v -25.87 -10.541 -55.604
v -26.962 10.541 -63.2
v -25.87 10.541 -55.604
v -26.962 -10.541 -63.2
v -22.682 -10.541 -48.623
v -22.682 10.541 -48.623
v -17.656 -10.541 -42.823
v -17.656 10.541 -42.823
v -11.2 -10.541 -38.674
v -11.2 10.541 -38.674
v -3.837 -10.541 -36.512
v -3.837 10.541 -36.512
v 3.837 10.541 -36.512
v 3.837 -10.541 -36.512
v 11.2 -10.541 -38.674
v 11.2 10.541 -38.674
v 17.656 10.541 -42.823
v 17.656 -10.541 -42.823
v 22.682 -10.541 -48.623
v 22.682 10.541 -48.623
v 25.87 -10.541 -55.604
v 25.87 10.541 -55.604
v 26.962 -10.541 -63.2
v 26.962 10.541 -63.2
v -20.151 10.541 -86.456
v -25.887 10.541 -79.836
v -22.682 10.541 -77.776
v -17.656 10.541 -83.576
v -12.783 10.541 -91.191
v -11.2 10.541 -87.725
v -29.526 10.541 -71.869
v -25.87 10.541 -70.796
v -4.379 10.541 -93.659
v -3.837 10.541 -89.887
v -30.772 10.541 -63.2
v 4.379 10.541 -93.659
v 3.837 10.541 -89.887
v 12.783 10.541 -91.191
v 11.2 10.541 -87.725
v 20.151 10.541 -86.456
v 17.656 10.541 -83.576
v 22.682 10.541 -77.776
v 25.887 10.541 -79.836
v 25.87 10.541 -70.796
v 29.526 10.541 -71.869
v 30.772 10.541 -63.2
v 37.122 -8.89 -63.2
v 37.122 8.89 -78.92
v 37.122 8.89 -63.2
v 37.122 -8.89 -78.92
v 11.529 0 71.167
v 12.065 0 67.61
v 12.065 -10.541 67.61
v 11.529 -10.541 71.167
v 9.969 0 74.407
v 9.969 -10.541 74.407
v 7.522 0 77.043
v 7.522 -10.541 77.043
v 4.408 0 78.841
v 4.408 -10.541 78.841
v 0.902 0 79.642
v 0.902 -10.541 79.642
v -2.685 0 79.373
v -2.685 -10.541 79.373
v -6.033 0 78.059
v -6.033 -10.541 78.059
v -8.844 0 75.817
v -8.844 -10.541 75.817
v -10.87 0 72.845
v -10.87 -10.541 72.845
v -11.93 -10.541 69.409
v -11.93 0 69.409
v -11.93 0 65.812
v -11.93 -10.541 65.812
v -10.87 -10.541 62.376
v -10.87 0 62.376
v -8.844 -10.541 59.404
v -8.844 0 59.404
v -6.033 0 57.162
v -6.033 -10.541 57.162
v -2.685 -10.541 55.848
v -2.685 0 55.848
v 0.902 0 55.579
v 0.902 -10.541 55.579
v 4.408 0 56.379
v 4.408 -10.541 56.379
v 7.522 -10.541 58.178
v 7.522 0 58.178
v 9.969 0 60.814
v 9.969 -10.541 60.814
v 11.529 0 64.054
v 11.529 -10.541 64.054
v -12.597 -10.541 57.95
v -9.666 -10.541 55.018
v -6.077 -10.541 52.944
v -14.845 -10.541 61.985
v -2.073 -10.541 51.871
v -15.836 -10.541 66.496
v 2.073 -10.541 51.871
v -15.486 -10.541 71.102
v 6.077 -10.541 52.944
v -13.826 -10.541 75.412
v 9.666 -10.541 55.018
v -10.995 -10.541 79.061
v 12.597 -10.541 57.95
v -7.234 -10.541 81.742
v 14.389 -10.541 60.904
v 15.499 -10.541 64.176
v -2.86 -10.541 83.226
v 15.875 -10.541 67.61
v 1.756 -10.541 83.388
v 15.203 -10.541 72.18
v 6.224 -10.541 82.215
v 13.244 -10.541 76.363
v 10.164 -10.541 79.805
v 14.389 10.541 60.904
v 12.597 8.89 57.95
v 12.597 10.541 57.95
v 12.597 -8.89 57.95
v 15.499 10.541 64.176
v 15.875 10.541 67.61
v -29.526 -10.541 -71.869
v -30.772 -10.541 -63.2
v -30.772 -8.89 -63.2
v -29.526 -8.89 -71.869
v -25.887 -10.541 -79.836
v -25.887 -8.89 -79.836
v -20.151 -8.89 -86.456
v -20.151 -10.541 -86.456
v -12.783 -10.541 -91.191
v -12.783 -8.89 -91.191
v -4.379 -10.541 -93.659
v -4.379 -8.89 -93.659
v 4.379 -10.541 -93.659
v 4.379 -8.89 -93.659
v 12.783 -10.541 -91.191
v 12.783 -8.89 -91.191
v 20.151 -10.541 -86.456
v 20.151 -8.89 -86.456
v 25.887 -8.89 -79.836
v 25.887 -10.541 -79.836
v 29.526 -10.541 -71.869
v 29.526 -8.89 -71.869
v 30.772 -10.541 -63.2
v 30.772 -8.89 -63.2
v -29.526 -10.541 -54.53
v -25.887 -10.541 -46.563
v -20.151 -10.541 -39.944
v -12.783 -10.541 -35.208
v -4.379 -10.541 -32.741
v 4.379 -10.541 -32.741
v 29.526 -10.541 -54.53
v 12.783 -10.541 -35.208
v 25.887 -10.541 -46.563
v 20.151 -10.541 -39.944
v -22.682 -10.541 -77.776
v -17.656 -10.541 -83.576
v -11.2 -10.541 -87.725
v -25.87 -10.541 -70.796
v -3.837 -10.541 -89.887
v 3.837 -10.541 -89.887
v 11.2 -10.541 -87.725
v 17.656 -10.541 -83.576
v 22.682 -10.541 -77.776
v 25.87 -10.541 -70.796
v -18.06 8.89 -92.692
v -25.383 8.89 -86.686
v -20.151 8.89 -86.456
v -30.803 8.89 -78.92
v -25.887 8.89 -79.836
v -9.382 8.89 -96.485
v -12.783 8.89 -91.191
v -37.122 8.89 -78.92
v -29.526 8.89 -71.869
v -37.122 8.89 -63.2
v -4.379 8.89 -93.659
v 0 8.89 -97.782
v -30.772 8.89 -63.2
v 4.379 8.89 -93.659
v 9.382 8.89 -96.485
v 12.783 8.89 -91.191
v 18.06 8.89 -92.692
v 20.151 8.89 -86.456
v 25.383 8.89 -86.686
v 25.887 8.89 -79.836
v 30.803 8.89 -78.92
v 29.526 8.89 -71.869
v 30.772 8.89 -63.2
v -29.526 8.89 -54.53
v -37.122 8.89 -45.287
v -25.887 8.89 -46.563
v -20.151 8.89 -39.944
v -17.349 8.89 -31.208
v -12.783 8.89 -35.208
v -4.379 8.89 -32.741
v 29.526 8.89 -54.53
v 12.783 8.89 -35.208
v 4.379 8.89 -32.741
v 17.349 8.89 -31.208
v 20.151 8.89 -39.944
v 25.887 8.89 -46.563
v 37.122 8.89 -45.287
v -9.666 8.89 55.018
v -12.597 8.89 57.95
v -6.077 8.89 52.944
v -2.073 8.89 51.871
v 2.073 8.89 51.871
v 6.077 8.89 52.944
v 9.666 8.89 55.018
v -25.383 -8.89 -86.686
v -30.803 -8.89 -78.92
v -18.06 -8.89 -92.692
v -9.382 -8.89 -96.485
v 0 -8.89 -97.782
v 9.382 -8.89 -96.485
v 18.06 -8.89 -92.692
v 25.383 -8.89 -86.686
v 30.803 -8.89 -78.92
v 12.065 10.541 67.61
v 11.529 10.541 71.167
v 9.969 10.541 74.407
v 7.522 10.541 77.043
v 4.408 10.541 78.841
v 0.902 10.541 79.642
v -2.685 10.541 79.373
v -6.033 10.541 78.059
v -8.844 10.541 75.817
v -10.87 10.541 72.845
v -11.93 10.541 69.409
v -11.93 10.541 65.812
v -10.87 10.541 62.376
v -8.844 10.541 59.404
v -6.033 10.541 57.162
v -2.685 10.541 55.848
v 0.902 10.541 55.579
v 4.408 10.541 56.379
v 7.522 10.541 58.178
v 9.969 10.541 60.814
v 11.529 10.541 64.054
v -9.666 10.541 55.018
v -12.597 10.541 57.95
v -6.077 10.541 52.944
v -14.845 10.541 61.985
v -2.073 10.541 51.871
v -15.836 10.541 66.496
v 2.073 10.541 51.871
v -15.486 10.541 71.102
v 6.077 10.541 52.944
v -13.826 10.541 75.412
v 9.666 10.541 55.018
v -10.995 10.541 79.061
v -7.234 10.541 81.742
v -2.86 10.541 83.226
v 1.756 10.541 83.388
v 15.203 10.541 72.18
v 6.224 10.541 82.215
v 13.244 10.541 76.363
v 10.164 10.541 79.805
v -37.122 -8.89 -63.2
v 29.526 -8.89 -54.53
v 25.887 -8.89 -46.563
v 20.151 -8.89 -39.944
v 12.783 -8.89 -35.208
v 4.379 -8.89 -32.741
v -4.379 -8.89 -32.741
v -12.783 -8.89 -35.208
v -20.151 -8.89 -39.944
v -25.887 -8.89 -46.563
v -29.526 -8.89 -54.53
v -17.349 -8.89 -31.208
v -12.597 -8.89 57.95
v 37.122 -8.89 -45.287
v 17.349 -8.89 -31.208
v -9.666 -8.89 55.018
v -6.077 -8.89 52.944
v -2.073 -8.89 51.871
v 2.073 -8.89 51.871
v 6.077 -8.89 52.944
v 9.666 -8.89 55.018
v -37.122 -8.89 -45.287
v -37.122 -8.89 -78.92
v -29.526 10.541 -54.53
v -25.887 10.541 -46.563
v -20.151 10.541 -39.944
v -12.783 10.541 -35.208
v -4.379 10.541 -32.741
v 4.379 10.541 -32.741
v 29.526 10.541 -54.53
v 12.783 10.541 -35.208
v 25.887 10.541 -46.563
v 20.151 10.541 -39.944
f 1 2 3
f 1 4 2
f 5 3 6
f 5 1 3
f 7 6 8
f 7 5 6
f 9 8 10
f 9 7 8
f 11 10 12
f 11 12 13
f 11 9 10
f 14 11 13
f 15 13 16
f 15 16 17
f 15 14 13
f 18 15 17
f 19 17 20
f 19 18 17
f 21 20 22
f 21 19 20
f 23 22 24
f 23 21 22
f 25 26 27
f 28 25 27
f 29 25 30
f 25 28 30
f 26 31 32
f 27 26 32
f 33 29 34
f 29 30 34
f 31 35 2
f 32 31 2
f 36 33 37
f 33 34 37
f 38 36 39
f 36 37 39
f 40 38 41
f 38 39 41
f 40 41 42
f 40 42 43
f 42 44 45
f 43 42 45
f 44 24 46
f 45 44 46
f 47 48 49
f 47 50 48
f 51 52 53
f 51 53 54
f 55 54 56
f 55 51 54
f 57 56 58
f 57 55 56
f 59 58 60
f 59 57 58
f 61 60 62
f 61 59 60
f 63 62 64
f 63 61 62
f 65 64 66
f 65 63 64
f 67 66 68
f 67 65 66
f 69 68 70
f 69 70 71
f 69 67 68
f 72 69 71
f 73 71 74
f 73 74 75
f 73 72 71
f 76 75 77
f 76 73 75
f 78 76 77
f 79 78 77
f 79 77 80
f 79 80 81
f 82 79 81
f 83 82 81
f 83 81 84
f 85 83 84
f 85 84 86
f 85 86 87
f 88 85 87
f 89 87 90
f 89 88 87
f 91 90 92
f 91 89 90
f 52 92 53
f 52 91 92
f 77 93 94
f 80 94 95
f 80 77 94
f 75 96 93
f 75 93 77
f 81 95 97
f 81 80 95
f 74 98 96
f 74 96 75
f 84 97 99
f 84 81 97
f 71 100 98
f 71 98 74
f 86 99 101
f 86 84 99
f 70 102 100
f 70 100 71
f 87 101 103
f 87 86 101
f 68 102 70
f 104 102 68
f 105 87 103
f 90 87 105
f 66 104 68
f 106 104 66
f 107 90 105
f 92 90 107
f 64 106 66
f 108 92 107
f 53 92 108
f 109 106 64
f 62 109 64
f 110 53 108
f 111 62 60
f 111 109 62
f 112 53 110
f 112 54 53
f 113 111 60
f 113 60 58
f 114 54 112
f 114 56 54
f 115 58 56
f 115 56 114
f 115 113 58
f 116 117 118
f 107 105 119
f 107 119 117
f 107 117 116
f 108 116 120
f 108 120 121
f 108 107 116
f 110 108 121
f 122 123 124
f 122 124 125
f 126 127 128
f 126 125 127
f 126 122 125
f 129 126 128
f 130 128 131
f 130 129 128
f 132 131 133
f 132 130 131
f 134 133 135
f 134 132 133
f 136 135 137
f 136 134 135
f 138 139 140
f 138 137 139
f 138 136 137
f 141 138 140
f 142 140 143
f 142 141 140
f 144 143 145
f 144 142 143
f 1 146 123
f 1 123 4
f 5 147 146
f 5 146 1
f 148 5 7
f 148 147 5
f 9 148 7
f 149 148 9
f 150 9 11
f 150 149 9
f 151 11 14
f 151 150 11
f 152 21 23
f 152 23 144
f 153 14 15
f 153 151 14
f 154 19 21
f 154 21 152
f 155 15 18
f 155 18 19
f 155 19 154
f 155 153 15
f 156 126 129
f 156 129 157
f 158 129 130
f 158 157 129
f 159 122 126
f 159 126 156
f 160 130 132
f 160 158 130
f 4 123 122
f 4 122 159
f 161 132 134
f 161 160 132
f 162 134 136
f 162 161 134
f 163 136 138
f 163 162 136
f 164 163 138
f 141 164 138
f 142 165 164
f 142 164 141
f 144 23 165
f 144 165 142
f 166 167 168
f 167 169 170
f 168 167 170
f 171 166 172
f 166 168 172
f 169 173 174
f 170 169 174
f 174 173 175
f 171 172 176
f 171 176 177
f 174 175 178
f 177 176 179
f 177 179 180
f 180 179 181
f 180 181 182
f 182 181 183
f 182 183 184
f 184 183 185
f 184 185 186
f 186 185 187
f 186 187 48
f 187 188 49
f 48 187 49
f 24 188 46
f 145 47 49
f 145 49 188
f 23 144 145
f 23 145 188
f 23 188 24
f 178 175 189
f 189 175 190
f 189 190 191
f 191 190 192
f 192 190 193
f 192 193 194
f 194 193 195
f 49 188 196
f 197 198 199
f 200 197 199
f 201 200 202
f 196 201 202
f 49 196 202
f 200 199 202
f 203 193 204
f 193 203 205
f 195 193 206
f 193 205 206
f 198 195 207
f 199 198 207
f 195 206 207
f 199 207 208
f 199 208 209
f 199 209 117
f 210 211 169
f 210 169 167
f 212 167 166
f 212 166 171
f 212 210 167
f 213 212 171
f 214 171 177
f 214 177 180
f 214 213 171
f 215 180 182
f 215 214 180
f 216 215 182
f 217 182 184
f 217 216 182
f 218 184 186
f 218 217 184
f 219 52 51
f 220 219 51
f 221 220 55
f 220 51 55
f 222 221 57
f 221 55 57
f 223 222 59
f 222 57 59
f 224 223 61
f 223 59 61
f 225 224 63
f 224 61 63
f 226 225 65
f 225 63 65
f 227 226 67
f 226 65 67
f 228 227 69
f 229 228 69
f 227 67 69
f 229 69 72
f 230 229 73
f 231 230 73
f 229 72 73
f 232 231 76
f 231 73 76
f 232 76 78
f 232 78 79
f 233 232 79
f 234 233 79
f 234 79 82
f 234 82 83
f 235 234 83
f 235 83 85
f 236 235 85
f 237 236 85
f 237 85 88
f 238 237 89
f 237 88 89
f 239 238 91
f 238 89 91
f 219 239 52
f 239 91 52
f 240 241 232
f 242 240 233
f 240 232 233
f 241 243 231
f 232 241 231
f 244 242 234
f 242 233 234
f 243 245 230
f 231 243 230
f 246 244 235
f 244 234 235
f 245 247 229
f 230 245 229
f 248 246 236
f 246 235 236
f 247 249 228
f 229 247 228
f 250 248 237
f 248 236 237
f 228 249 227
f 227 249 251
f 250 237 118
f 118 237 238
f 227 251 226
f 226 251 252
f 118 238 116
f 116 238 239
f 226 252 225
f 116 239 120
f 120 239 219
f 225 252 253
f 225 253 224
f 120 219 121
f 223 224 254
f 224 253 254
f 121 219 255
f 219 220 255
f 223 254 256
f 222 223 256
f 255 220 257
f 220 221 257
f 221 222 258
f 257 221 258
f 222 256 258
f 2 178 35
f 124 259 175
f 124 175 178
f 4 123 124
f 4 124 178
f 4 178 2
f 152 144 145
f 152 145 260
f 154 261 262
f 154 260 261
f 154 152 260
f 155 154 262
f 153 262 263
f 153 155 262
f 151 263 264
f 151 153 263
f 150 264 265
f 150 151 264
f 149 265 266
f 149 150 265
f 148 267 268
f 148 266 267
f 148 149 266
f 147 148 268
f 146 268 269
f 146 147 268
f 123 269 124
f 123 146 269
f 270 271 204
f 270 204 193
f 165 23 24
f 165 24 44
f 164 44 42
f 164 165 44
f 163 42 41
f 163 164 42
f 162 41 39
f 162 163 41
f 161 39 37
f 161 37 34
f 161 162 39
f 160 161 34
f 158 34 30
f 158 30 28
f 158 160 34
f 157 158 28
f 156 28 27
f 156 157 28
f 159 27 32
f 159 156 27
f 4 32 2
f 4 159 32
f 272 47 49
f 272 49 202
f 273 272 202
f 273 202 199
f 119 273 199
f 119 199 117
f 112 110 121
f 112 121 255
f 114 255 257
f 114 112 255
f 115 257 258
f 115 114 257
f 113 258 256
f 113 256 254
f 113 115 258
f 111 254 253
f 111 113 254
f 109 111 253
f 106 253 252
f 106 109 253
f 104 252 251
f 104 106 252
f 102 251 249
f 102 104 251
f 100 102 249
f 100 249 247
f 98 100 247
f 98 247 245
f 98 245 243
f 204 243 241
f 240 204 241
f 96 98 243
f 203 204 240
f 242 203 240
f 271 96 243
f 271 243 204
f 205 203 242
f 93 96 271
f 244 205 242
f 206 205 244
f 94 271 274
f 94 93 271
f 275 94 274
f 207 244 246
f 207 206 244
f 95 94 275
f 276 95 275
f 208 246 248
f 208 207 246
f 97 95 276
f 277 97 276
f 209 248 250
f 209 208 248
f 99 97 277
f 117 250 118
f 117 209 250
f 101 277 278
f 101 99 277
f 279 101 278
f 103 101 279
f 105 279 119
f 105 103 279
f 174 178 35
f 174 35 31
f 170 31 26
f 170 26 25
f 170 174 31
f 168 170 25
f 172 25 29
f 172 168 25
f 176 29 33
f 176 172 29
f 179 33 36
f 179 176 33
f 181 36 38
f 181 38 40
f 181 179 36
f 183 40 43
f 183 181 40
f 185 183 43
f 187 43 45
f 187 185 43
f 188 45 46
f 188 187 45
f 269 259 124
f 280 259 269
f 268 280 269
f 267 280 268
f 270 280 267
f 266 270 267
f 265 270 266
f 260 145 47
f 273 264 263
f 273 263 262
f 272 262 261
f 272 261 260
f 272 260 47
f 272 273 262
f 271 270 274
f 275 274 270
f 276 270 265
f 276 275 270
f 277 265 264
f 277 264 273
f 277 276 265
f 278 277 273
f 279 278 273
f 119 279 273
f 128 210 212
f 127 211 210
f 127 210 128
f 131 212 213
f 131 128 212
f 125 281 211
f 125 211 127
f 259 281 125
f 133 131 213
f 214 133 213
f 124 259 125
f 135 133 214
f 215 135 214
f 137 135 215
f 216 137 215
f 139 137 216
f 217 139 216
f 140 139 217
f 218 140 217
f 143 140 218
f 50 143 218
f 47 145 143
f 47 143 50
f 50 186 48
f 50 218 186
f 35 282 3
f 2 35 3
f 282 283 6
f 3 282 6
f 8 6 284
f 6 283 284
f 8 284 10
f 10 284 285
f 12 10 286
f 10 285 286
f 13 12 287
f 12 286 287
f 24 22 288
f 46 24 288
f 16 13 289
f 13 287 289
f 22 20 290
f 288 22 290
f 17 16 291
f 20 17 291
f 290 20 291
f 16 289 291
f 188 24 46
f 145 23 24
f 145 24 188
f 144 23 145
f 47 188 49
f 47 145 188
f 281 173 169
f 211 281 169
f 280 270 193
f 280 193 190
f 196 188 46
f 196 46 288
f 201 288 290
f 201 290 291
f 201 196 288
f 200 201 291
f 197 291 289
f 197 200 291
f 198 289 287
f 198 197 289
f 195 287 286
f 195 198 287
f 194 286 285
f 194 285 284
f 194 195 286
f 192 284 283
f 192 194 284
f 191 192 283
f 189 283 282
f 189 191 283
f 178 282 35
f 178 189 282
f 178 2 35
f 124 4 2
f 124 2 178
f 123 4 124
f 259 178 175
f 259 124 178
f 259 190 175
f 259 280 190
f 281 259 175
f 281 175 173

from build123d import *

# Parameters (mm, degrees)
F1_DEPTH = 10.541
F2_DEPTH = 8.89
F3_DEPTH = 10.541
F4_DEPTH = 8.89
F0_R     = 12.065
F5_DEPTH = 10.541


with BuildPart() as f1:
    # F0 (on Front) → F1 (new body, symmetric)
    with BuildSketch(Plane.XZ):
        with BuildLine():
            ThreePointArc((-26.9621, -63.1996413046), (0, -36.2375413046), (26.9621, -63.1996413046))
            Line((26.9621, -63.1996413046), (30.7721, -63.1996413046))
            ThreePointArc((30.7721, -63.1996413046), (0, -32.4275413046), (-30.7721, -63.1996413046))
            Line((-30.7721, -63.1996413046), (-26.9621, -63.1996413046))
        make_face()
    extrude(amount=F1_DEPTH, both=True)

    # F0 (on Front) → F2 (join, symmetric)
    with BuildSketch(Plane.XZ):
        with BuildLine():
            ThreePointArc((-30.7721, -63.1996413046), (0, -32.4275413046), (30.7721, -63.1996413046))
            Line((30.7721, -63.1996413046), (37.1221, -63.1996413046))
            Line((37.1221, -63.1996413046), (37.1221, -45.2870428562))
            Line((37.1221, -45.2870428562), (17.3492934555, -31.2083195895))
            Line((17.3492934555, -31.2083195895), (12.597056389, 57.9496239752))
            ThreePointArc((12.597056389, 57.9496239752), (0, 51.7353586954), (-12.597056389, 57.9496239752))
            Line((-12.597056389, 57.9496239752), (-17.3492934555, -31.2083195895))
            Line((-17.3492934555, -31.2083195895), (-37.1221, -45.2870428562))
            Line((-37.1221, -45.2870428562), (-37.1221, -63.1996413046))
            Line((-37.1221, -63.1996413046), (-30.7721, -63.1996413046))
        make_face()
    extrude(amount=F2_DEPTH, both=True)

    # F0 (on Front) → F5 (join, symmetric)
    with BuildSketch(Plane.XZ):
        with BuildLine():
            ThreePointArc((-12.597056389, 57.9496239752), (0, 51.7353586954), (12.597056389, 57.9496239752))
            ThreePointArc((12.597056389, 57.9496239752), (15.0331948563, 62.5095080396), (15.875, 67.6103586954))
            ThreePointArc((15.875, 67.6103586954), (-5.1008506558, 82.6435535517), (-12.597056389, 57.9496239752))
        make_face()
        with Locations((0, 67.6103586954)):
            Circle(F0_R, mode=Mode.SUBTRACT)
    extrude(amount=F5_DEPTH, both=True)


with BuildPart() as f3:
    # F0 (on Front) → F3 (new body, symmetric)
    with BuildSketch(Plane.XZ):
        with BuildLine():
            Line((30.7721, -63.1996413046), (26.9621, -63.1996413046))
            ThreePointArc((26.9621, -63.1996413046), (0, -90.1617413046), (-26.9621, -63.1996413046))
            Line((-26.9621, -63.1996413046), (-30.7721, -63.1996413046))
            ThreePointArc((-30.7721, -63.1996413046), (0, -93.9717413046), (30.7721, -63.1996413046))
        make_face()
    extrude(amount=F3_DEPTH, both=True)

    # F0 (on Front) → F4 (join, symmetric)
    with BuildSketch(Plane.XZ):
        with BuildLine():
            Line((37.1221, -63.1996413046), (30.7721, -63.1996413046))
            ThreePointArc((30.7721, -63.1996413046), (0, -93.9717413046), (-30.7721, -63.1996413046))
            Line((-30.7721, -63.1996413046), (-37.1221, -63.1996413046))
            Line((-37.1221, -63.1996413046), (-37.1221, -78.9195522666))
            Line((-37.1221, -78.9195522666), (-30.8026953327, -78.9195522666))
            ThreePointArc((-30.8026953327, -78.9195522666), (0, -97.7817413046), (30.8026953327, -78.9195522666))
            Line((30.8026953327, -78.9195522666), (37.1221, -78.9195522666))
            Line((37.1221, -78.9195522666), (37.1221, -63.1996413046))
        make_face()
    extrude(amount=F4_DEPTH, both=True)


solid = Compound([f1.part, f3.part])
